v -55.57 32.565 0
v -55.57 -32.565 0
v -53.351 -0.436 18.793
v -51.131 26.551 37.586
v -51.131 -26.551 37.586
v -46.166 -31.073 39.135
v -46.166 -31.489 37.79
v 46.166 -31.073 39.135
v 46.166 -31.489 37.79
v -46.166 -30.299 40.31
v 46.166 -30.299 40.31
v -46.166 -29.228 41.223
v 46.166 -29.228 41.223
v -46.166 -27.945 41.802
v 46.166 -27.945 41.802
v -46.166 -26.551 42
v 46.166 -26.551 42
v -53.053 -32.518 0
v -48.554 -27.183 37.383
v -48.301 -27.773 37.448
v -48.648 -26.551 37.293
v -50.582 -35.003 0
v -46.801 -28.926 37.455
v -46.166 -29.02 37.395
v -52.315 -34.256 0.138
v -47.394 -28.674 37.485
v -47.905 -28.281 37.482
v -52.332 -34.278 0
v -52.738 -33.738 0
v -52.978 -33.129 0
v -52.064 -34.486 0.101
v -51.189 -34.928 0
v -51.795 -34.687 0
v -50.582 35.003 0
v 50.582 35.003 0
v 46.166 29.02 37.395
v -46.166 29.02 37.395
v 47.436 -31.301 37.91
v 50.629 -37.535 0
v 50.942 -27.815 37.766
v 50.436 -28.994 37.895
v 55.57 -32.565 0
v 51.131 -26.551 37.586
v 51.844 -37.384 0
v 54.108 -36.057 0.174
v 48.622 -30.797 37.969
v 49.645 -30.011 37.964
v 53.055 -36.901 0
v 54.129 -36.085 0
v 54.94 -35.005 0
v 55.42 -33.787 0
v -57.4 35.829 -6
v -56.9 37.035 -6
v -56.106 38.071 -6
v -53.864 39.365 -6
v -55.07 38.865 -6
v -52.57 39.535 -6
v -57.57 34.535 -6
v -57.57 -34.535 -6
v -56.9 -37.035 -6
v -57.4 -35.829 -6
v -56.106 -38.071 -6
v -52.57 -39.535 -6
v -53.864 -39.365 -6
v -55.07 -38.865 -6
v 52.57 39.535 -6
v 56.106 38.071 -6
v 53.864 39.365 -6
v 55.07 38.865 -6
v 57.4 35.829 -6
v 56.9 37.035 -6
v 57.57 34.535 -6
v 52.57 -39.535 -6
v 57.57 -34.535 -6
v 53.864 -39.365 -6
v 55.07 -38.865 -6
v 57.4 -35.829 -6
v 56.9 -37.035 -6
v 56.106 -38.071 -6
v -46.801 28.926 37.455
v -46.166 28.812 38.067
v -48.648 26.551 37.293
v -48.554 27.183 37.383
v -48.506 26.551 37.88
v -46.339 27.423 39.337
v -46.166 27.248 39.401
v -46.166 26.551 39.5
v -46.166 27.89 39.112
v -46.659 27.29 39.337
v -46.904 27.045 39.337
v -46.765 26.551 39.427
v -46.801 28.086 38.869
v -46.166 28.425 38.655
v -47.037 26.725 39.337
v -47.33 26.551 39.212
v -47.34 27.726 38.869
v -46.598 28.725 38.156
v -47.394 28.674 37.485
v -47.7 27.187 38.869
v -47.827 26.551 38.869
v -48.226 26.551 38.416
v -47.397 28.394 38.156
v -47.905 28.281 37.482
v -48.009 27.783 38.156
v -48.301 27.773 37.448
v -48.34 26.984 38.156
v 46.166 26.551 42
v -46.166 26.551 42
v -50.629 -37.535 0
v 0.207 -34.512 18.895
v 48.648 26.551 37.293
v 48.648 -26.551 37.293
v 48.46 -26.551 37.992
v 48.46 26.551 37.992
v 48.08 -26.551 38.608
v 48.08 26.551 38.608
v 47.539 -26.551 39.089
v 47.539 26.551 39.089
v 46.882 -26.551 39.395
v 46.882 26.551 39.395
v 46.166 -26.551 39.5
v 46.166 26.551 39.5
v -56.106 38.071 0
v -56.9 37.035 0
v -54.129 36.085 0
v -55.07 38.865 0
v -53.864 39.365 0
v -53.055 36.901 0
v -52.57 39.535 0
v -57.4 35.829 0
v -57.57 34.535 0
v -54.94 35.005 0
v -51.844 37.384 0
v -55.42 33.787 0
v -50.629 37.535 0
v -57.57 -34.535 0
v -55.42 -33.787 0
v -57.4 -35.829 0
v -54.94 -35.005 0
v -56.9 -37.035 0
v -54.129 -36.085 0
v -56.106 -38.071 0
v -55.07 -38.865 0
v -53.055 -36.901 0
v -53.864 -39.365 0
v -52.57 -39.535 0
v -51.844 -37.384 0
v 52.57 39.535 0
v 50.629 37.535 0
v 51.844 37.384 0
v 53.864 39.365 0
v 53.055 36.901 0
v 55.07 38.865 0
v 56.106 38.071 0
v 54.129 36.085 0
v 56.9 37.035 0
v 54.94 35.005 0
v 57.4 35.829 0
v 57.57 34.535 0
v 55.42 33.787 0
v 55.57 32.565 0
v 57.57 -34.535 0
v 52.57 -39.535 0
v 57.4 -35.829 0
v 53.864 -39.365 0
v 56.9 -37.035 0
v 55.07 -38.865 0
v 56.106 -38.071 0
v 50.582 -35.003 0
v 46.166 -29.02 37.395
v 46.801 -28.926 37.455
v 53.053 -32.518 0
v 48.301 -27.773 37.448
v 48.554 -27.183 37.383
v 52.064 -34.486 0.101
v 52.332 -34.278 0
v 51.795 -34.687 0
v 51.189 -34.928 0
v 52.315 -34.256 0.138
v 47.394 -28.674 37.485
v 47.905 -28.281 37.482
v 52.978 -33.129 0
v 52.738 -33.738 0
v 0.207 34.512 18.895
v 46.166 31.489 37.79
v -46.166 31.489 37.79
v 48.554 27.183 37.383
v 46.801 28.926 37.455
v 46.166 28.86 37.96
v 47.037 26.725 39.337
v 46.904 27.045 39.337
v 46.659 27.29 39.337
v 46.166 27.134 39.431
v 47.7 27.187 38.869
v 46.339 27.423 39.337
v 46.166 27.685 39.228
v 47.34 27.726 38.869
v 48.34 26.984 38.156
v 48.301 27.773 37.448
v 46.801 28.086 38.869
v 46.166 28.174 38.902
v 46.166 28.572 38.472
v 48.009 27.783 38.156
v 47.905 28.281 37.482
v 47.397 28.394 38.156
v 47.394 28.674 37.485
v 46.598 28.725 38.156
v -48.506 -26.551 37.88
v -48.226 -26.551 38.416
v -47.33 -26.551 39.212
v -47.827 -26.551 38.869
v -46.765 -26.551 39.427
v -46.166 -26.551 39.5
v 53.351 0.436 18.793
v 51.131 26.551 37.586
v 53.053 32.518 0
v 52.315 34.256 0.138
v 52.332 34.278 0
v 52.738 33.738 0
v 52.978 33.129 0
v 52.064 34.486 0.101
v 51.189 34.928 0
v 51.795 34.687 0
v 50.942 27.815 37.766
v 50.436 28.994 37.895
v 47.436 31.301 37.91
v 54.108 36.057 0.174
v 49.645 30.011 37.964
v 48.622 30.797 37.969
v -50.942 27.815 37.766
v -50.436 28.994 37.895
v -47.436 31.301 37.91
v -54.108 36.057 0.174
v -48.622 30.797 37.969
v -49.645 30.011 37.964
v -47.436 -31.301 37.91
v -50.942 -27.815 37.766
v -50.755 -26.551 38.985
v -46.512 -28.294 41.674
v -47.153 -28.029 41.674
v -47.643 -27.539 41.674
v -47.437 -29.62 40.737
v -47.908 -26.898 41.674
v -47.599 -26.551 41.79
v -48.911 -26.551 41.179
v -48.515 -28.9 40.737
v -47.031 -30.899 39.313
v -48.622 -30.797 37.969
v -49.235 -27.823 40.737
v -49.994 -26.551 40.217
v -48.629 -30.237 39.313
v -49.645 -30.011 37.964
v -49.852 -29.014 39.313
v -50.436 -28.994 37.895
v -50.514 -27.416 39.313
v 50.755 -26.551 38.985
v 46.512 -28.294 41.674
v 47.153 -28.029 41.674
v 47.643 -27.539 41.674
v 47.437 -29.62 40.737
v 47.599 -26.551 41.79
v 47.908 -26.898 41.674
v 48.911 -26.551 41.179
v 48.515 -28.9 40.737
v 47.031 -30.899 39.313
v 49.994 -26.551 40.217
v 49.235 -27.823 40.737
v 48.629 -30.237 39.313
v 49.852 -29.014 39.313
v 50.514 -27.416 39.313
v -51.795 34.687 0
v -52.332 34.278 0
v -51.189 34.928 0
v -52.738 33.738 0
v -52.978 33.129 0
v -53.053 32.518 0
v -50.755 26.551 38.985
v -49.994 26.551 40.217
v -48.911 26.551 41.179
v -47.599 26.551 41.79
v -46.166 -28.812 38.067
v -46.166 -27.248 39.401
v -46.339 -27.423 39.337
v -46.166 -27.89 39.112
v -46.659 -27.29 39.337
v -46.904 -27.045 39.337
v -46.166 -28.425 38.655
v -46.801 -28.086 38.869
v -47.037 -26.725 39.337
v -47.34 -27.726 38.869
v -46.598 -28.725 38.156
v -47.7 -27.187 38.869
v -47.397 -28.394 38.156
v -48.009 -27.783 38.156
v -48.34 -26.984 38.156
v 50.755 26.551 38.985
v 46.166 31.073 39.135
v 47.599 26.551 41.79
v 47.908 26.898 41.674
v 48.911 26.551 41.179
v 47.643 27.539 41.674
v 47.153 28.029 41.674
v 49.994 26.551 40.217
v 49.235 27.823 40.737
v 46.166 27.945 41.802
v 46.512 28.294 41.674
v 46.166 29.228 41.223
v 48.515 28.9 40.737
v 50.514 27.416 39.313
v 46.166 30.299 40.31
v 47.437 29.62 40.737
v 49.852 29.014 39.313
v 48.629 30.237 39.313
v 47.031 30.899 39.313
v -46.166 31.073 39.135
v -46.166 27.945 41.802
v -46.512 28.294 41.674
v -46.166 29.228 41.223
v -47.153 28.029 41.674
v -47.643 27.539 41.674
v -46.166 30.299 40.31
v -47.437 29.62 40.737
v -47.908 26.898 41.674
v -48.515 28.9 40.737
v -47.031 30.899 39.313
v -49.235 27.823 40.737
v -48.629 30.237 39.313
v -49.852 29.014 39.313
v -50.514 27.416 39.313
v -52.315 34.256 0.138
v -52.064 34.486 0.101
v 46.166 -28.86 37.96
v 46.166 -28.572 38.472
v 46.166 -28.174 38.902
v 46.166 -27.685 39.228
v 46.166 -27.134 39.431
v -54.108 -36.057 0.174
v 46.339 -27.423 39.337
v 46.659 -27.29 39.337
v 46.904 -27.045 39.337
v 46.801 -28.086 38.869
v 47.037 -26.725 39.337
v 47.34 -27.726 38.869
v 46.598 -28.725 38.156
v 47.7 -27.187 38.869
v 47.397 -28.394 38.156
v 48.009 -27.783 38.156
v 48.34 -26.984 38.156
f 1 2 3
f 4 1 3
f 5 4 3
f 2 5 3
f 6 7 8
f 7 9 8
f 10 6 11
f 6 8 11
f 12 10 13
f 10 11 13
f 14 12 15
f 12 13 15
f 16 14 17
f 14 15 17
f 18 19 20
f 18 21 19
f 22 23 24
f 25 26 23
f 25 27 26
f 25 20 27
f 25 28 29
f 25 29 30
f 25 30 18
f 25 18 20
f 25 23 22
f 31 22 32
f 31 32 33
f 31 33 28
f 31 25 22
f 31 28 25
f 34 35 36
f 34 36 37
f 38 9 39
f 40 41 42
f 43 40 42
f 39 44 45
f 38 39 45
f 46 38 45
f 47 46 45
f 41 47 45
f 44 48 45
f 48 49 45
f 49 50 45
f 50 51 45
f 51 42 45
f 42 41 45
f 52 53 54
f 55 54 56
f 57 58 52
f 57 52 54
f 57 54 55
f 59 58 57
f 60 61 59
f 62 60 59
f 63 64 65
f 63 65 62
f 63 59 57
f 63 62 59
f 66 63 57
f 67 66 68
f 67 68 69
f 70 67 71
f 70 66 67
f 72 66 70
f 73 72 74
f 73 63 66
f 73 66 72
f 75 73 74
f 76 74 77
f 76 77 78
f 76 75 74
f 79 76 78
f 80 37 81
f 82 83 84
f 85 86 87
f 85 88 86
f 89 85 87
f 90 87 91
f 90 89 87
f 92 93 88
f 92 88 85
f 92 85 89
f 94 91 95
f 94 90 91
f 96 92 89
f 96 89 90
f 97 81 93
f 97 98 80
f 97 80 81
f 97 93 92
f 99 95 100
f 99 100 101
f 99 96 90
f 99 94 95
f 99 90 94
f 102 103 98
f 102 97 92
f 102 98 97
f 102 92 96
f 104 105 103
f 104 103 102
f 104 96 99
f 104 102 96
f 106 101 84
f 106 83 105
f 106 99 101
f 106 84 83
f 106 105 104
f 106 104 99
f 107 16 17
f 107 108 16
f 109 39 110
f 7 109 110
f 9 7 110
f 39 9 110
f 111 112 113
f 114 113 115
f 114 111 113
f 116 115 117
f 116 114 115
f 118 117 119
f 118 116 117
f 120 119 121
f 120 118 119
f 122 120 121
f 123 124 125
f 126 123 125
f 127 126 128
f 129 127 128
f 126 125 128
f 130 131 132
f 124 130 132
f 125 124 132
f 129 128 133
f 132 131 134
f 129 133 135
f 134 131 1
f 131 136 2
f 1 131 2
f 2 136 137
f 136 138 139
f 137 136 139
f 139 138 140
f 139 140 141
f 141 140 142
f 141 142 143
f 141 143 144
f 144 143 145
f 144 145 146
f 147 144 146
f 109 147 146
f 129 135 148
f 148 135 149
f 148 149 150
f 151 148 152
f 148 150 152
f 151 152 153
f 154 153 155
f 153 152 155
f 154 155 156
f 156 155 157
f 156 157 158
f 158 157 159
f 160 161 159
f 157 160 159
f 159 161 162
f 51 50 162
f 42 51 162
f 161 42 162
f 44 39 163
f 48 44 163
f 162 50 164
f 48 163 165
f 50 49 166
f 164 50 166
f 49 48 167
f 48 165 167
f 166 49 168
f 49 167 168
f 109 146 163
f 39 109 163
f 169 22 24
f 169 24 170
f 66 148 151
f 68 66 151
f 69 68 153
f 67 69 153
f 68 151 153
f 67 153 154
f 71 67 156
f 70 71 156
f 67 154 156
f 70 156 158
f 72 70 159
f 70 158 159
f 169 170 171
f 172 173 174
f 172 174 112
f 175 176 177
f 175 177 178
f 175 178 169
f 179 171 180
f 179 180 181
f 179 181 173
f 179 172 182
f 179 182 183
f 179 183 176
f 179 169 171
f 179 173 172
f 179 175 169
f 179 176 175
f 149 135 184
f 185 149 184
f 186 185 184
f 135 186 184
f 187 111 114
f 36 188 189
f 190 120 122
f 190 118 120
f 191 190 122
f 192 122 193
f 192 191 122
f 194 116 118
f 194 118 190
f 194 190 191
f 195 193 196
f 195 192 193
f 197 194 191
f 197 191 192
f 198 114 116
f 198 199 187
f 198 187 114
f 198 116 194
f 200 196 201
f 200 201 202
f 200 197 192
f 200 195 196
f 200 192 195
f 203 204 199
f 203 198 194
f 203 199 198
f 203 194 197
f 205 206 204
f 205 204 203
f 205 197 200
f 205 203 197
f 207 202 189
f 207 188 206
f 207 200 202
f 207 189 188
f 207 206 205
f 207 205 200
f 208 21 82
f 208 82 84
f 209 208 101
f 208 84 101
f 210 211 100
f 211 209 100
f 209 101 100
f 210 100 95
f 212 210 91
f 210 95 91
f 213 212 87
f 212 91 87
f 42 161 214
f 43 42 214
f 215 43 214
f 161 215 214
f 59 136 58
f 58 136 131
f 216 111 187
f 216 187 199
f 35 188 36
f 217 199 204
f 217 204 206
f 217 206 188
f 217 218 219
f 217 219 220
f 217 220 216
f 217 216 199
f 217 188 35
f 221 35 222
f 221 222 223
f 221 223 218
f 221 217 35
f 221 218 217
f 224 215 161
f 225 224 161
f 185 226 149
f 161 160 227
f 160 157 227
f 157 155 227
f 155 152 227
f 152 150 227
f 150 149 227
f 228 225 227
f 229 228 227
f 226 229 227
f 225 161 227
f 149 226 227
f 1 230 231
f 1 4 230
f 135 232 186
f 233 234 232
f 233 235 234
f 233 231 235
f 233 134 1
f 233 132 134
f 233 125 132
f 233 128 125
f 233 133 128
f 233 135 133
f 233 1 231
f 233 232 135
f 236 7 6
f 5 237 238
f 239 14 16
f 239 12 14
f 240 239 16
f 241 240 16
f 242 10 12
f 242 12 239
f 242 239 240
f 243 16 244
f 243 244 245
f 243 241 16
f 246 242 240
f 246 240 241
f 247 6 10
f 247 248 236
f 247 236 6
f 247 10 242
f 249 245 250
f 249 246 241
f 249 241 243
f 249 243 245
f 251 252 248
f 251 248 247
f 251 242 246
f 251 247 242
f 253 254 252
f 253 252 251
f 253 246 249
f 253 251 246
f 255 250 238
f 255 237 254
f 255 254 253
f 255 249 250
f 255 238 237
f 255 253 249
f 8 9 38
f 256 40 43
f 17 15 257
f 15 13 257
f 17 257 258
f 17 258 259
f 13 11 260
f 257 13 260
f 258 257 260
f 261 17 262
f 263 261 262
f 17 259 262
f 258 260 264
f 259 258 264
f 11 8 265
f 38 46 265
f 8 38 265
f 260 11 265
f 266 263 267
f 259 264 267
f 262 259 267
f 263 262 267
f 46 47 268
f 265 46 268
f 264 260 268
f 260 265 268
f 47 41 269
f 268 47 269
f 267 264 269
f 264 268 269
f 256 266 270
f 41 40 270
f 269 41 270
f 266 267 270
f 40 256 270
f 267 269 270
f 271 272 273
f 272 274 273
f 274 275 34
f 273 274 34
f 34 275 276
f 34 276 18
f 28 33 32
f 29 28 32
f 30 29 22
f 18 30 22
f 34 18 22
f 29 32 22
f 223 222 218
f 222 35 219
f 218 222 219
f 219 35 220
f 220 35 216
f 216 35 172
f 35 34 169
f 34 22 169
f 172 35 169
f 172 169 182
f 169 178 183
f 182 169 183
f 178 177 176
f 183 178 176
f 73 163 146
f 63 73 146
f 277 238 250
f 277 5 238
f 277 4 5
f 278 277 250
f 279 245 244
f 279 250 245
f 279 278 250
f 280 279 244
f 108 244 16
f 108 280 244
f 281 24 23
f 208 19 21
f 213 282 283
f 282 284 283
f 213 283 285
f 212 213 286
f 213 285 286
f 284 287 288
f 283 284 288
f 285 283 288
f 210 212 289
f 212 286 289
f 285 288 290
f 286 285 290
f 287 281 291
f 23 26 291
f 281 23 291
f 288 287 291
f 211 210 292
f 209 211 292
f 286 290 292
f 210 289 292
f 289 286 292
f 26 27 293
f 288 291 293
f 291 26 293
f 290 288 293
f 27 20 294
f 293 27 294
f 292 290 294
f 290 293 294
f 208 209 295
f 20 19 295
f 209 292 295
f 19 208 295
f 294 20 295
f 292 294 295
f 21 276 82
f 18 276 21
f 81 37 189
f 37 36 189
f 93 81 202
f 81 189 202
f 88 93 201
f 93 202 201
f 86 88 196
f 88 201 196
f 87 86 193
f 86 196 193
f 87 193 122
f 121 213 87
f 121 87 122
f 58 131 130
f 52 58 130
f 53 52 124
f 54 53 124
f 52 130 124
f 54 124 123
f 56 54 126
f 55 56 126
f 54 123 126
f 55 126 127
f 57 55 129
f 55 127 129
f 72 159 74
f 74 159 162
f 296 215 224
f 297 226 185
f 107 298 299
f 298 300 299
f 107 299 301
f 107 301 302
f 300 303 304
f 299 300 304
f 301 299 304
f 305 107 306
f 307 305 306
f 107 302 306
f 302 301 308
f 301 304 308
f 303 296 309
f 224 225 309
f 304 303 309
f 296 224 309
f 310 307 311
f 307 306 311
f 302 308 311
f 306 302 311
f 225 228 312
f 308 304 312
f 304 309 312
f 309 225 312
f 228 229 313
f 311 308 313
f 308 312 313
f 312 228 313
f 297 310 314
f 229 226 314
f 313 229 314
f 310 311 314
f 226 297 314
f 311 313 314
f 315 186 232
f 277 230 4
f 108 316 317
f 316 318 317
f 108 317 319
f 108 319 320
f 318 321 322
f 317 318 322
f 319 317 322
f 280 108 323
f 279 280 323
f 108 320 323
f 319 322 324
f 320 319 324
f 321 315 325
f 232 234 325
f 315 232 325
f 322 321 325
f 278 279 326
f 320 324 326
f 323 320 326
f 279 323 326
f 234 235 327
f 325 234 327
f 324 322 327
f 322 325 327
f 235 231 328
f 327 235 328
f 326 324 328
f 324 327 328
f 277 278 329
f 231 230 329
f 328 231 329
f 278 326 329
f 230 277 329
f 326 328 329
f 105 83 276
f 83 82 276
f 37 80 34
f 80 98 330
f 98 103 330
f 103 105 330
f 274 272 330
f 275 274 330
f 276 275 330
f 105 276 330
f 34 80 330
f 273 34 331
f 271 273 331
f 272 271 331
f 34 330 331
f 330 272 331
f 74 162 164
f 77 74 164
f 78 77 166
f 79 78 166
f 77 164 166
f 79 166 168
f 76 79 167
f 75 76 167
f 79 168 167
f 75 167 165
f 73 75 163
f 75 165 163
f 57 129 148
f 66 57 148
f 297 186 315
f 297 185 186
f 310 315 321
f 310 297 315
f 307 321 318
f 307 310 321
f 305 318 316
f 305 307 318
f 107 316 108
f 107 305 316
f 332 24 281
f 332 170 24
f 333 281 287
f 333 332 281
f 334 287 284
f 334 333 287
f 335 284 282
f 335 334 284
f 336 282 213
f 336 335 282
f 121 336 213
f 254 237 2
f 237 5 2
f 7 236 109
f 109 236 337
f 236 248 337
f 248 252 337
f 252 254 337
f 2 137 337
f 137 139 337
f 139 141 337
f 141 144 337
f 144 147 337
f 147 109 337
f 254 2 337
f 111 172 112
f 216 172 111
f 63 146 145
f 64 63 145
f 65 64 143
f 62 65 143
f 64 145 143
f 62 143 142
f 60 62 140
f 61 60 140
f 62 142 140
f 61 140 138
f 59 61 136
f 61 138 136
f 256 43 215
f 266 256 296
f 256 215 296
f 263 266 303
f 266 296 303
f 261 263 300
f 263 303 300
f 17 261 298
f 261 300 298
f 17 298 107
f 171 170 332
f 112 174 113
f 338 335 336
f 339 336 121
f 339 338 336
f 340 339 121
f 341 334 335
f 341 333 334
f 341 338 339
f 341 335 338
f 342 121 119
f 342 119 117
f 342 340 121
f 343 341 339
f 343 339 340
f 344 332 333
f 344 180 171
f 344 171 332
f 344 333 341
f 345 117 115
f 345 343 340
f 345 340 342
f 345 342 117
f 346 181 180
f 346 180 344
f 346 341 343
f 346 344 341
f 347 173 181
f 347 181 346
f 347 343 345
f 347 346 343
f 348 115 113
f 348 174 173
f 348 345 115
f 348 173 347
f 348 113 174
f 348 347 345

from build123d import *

# Parameters (mm, degrees)
F2_W     = 101.22
F2_H     = 61.63
F0_W     = 111.14
F0_H     = 75.07
F4_R     = 5
F5_T     = 2.5
F7_DEPTH = 6


# Not quite as in the source:
# - a shell that OpenCascade refuses in one call is made with other operations: the cavity is built on its own and cut out


with BuildPart() as f3:
    # F2 (on offset) → F3 section 0
    with BuildSketch(Plane.XY.offset(42)):
        Rectangle(F2_W, F2_H)
    # F0 (on Top) → F3 section 1
    with BuildSketch(Plane.XY):
        Rectangle(F0_W, F0_H)
    loft()

    # F4
    f4_edges = [f3.edges().sort_by_distance(p)[0] for p in [
        (-53.09, 34.175, 21),
        (53.09, 34.175, 21),
        (53.09, -34.175, 21),
        (-53.09, -34.175, 21),
        (0, -30.815, 42),
        (50.61, 0, 42),
        (0, 30.815, 42),
        (-50.61, 0, 42),
    ]]
    fillet(f4_edges, radius=F4_R)

    # F5: shell of thickness 2.5, made by hand


with BuildPart() as f5_core1:
    # F5_t2: copy of F3
    add(f3.part)

    # the walls: a layer under each face that stays
    f5_faces = [f5_core1.faces().sort_by_distance(p)[0] for p in [
        (-53.3506124987, 0, 18.7932006155),
        (-51.8873286605, 33.0489229278, 18.9750242391),
        (-51.8873286605, -33.0489229278, 18.9750242391),
        (-49.4874767675, 0, 40.7371115956),
        (0, 34.5118037996, 18.8949762528),
        (0, -34.5118037996, 18.8949762528),
        (51.8873286605, 33.0489229278, 18.9750242391),
        (51.8873299173, -33.0489246306, 18.9750135967),
        (53.3506124987, 0, 18.7932006155),
        (-48.5145599261, 28.9002335794, 40.7371115784),
        (-48.5145599261, -28.9002335794, 40.7371115784),
        (0, 0, 42),
        (0, 29.7956483786, 40.8045868716),
        (0, -29.7956483786, 40.8045868716),
        (48.5145600153, 28.9002373676, 40.7371091413),
        (48.5145599261, -28.9002335794, 40.7371115784),
        (49.4874767675, 0, 40.7371115956),
    ]]
    thicken(f5_faces, amount=-F5_T, mode=Mode.SUBTRACT)


with BuildPart() as f3_1:
    add(f3.part)

    # what is left inside the walls is the cavity
    f5_cavity = [f5_core1.part.solids().sort_by_distance(p)[0] for p in [
        (10.775811, 15.952675, 0.025),
    ]]
    add(f5_cavity, mode=Mode.SUBTRACT)

    # F6 (on face) → F7 (join)
    with BuildSketch(Plane(origin=(0, 0, 0), x_dir=(1, 0, 0), z_dir=(0, 0, -1))):
        with BuildLine():
            Line((52.57, 39.535), (-52.57, 39.535))
            ThreePointArc((-52.57, 39.535), (-56.1055339059, 38.0705339059), (-57.57, 34.535))
            Line((-57.57, 34.535), (-57.57, -34.535))
            ThreePointArc((-57.57, -34.535), (-56.1055339059, -38.0705339059), (-52.57, -39.535))
            Line((-52.57, -39.535), (52.57, -39.535))
            ThreePointArc((52.57, -39.535), (56.1055339059, -38.0705339059), (57.57, -34.535))
            Line((57.57, -34.535), (57.57, 34.535))
            ThreePointArc((57.57, 34.535), (56.1055339059, 38.0705339059), (52.57, 39.535))
        make_face()
    extrude(amount=F7_DEPTH)


solid = f3_1.part
